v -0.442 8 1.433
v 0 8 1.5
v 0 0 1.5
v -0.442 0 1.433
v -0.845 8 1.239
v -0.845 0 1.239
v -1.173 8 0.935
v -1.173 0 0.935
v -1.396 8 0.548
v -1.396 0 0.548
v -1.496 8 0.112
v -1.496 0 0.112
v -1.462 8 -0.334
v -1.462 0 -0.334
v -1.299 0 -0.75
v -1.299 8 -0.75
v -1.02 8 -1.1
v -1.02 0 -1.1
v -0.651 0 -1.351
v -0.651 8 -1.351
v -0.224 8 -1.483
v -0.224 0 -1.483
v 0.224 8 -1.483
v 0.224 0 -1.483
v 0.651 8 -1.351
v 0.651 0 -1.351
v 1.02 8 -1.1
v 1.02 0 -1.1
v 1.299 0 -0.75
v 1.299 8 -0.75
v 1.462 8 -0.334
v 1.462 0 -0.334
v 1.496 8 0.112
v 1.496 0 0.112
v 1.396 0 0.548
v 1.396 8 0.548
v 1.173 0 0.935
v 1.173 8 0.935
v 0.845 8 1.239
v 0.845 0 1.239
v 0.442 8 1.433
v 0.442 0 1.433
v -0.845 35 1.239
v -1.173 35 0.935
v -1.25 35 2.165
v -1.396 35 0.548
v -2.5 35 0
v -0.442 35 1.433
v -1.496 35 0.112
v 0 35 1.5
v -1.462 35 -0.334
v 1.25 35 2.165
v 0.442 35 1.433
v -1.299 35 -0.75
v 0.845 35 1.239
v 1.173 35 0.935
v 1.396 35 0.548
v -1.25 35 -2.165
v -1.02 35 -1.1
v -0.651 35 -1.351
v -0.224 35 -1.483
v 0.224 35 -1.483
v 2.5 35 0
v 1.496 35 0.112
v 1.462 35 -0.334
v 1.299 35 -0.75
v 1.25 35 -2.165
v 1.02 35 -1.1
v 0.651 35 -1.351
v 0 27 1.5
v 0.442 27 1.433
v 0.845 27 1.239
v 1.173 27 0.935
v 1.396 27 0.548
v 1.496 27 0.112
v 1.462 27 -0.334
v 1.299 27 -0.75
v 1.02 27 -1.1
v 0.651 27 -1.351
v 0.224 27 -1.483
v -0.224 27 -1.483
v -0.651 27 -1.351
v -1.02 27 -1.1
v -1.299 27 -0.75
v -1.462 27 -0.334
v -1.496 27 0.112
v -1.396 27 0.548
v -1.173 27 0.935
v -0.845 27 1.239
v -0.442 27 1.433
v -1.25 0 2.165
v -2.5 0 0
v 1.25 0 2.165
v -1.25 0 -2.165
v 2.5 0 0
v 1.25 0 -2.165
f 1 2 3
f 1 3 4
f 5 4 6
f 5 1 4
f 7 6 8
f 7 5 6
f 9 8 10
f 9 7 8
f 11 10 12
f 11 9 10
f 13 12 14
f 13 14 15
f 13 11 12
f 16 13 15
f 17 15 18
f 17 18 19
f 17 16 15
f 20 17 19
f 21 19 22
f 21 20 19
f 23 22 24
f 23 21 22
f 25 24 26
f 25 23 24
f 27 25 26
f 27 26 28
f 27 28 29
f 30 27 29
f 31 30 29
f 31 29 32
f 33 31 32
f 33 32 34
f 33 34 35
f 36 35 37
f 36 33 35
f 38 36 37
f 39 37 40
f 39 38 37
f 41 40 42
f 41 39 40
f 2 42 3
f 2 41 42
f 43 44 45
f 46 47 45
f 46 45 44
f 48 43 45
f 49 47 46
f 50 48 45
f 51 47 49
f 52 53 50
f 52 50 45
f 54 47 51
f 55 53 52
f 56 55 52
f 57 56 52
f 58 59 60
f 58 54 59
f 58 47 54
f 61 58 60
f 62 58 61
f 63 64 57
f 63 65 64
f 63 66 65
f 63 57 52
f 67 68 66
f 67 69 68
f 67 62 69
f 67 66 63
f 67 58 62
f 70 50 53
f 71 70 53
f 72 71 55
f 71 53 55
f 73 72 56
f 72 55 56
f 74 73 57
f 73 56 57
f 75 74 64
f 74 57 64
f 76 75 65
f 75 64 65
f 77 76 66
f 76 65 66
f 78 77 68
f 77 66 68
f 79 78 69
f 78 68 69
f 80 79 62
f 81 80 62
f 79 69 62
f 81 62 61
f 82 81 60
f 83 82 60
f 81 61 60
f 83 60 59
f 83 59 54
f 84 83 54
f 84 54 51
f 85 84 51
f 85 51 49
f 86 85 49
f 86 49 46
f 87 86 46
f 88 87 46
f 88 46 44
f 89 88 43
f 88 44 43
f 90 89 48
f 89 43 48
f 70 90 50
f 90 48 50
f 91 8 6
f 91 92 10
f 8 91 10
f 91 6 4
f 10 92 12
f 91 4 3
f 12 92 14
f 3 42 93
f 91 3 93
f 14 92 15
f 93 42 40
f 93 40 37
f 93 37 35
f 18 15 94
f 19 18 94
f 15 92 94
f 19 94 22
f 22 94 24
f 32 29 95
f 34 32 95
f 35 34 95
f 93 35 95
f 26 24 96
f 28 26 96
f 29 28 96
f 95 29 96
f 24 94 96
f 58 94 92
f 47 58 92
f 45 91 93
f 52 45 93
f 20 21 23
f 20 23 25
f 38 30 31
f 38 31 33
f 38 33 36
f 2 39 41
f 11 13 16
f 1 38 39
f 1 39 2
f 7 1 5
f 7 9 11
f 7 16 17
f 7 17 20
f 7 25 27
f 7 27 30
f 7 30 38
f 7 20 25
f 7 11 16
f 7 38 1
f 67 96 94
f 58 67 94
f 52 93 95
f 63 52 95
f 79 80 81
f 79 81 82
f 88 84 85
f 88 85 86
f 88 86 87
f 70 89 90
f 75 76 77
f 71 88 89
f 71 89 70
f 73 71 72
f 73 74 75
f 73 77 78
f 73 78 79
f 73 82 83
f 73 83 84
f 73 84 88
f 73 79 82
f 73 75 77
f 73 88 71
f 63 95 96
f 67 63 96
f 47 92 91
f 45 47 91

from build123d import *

# Parameters (mm, degrees)
RESSALTO_EXTRUS_O1_DEPTH = 35
ESBO_O2_R                = 1.5
CORTE_EXTRUS_O1_DEPTH    = 8
CORTE_EXTRUS_O2_START    = -8
ESBO_O3_R                = 1.5
CORTE_EXTRUS_O2_DEPTH    = 8


with BuildPart() as part:
    # Esboço1 → Ressalto-extrusão1 (new body)
    with BuildSketch(Plane(origin=(0, 0, 0), x_dir=(1, 0, 0), z_dir=(0, 1, 0))):
        Polygon((2.5, 0), (1.25, 2.165063509), (-1.25, 2.165063509), (-2.5, 0), (-1.25, -2.165063509), (1.25, -2.165063509), align=None)
    extrude(amount=RESSALTO_EXTRUS_O1_DEPTH)

    # Esboço2 → Corte-extrusão1 (cut)
    with BuildSketch(Plane(origin=(0, 35, 0), x_dir=(1, 0, 0), z_dir=(0, 1, 0))):
        with Locations(Location((0, 0, 0), (0, 0, 270))):
            Circle(ESBO_O2_R)
    extrude(amount=-CORTE_EXTRUS_O1_DEPTH, mode=Mode.SUBTRACT)

    # Esboço3 → Corte-extrusão2 (cut)
    with BuildSketch(Plane.XZ.offset(CORTE_EXTRUS_O2_START)):
        with Locations(Location((0, 0, 0), (0, 0, 90))):
            Circle(ESBO_O3_R)
    extrude(amount=CORTE_EXTRUS_O2_DEPTH, mode=Mode.SUBTRACT)


solid = part.part
